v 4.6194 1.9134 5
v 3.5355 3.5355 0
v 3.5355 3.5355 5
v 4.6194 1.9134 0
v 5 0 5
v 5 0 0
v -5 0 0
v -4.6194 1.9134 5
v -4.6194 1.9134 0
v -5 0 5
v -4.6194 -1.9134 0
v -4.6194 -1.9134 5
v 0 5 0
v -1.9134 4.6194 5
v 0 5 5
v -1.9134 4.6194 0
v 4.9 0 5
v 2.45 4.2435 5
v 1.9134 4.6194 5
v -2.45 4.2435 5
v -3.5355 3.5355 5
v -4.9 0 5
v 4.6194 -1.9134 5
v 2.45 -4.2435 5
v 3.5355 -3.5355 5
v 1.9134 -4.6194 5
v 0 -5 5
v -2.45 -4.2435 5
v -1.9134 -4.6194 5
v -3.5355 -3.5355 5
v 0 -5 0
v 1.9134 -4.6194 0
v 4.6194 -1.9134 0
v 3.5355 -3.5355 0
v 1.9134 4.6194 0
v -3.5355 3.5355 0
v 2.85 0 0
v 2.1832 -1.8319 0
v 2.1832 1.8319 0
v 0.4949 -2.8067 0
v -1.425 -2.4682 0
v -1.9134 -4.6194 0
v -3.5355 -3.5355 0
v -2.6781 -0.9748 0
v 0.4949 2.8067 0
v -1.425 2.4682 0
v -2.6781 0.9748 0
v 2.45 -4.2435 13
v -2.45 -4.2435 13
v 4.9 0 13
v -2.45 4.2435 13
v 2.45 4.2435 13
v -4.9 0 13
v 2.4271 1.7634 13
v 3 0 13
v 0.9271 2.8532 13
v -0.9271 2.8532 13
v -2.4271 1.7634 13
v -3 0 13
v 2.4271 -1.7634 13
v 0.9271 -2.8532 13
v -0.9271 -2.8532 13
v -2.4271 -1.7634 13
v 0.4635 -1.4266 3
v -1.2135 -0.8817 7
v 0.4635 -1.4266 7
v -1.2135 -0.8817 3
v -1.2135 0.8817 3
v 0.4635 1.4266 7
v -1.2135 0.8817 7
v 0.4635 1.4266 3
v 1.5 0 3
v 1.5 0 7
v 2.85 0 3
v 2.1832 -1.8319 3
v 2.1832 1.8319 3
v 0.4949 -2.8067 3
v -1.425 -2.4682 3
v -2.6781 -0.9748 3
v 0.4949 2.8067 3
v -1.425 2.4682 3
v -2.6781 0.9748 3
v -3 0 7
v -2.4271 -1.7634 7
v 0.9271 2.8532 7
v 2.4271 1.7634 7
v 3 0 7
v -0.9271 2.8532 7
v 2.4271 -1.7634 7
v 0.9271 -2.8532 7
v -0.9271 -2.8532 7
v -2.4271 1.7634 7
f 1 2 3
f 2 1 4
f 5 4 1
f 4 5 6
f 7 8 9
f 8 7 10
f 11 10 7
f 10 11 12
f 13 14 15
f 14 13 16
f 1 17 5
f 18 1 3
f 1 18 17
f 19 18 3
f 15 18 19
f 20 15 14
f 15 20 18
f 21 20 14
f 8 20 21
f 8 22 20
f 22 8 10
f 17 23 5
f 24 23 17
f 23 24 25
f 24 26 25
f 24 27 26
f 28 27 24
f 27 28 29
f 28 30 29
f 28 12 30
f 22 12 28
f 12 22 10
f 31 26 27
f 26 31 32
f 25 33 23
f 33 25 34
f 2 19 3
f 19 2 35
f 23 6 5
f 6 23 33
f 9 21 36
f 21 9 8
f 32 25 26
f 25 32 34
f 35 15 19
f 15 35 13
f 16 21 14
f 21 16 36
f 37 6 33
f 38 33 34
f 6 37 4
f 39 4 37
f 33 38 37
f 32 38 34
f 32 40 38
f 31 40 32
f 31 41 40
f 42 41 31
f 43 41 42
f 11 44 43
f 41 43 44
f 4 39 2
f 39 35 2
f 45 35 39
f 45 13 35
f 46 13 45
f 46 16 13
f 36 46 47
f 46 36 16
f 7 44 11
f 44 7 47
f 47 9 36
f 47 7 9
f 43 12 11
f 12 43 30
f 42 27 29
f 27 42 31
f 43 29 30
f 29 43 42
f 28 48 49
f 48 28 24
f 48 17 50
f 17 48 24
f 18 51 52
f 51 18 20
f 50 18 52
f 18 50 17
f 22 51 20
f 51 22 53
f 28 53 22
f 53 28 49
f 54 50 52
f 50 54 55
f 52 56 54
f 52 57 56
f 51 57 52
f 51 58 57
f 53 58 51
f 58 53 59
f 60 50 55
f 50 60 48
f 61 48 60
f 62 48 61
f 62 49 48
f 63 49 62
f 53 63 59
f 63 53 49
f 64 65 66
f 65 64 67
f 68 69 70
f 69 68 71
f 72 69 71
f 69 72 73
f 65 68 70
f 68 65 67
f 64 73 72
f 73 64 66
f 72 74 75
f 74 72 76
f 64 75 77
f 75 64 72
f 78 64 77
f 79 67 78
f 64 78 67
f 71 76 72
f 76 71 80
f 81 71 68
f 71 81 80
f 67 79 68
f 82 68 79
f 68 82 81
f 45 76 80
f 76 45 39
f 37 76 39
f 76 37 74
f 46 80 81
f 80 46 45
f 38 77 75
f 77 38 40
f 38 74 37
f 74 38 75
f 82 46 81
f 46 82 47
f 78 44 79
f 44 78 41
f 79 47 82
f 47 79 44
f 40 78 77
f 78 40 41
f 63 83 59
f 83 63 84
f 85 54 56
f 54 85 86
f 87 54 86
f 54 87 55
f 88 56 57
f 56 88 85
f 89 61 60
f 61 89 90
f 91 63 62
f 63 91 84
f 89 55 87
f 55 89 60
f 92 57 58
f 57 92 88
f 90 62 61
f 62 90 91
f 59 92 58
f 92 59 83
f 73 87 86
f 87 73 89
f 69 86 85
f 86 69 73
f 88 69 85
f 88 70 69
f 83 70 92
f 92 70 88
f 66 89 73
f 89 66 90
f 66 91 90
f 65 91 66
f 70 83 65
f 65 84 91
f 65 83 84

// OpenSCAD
module servo_rotate_rod() {
    difference() {
        union() {
            cylinder(d=10, h=5);
            cylinder(d=9.8, h=13, $fa=70);
        }
        translate([0, 0, -1])
        cylinder(d=3, h=30);
        translate([0, 0, -1])
        cylinder(d=5.7, h=4);
        translate([0, 0, 7])
        cylinder(d=6, h=30);
    }
}
servo_rotate_rod();
